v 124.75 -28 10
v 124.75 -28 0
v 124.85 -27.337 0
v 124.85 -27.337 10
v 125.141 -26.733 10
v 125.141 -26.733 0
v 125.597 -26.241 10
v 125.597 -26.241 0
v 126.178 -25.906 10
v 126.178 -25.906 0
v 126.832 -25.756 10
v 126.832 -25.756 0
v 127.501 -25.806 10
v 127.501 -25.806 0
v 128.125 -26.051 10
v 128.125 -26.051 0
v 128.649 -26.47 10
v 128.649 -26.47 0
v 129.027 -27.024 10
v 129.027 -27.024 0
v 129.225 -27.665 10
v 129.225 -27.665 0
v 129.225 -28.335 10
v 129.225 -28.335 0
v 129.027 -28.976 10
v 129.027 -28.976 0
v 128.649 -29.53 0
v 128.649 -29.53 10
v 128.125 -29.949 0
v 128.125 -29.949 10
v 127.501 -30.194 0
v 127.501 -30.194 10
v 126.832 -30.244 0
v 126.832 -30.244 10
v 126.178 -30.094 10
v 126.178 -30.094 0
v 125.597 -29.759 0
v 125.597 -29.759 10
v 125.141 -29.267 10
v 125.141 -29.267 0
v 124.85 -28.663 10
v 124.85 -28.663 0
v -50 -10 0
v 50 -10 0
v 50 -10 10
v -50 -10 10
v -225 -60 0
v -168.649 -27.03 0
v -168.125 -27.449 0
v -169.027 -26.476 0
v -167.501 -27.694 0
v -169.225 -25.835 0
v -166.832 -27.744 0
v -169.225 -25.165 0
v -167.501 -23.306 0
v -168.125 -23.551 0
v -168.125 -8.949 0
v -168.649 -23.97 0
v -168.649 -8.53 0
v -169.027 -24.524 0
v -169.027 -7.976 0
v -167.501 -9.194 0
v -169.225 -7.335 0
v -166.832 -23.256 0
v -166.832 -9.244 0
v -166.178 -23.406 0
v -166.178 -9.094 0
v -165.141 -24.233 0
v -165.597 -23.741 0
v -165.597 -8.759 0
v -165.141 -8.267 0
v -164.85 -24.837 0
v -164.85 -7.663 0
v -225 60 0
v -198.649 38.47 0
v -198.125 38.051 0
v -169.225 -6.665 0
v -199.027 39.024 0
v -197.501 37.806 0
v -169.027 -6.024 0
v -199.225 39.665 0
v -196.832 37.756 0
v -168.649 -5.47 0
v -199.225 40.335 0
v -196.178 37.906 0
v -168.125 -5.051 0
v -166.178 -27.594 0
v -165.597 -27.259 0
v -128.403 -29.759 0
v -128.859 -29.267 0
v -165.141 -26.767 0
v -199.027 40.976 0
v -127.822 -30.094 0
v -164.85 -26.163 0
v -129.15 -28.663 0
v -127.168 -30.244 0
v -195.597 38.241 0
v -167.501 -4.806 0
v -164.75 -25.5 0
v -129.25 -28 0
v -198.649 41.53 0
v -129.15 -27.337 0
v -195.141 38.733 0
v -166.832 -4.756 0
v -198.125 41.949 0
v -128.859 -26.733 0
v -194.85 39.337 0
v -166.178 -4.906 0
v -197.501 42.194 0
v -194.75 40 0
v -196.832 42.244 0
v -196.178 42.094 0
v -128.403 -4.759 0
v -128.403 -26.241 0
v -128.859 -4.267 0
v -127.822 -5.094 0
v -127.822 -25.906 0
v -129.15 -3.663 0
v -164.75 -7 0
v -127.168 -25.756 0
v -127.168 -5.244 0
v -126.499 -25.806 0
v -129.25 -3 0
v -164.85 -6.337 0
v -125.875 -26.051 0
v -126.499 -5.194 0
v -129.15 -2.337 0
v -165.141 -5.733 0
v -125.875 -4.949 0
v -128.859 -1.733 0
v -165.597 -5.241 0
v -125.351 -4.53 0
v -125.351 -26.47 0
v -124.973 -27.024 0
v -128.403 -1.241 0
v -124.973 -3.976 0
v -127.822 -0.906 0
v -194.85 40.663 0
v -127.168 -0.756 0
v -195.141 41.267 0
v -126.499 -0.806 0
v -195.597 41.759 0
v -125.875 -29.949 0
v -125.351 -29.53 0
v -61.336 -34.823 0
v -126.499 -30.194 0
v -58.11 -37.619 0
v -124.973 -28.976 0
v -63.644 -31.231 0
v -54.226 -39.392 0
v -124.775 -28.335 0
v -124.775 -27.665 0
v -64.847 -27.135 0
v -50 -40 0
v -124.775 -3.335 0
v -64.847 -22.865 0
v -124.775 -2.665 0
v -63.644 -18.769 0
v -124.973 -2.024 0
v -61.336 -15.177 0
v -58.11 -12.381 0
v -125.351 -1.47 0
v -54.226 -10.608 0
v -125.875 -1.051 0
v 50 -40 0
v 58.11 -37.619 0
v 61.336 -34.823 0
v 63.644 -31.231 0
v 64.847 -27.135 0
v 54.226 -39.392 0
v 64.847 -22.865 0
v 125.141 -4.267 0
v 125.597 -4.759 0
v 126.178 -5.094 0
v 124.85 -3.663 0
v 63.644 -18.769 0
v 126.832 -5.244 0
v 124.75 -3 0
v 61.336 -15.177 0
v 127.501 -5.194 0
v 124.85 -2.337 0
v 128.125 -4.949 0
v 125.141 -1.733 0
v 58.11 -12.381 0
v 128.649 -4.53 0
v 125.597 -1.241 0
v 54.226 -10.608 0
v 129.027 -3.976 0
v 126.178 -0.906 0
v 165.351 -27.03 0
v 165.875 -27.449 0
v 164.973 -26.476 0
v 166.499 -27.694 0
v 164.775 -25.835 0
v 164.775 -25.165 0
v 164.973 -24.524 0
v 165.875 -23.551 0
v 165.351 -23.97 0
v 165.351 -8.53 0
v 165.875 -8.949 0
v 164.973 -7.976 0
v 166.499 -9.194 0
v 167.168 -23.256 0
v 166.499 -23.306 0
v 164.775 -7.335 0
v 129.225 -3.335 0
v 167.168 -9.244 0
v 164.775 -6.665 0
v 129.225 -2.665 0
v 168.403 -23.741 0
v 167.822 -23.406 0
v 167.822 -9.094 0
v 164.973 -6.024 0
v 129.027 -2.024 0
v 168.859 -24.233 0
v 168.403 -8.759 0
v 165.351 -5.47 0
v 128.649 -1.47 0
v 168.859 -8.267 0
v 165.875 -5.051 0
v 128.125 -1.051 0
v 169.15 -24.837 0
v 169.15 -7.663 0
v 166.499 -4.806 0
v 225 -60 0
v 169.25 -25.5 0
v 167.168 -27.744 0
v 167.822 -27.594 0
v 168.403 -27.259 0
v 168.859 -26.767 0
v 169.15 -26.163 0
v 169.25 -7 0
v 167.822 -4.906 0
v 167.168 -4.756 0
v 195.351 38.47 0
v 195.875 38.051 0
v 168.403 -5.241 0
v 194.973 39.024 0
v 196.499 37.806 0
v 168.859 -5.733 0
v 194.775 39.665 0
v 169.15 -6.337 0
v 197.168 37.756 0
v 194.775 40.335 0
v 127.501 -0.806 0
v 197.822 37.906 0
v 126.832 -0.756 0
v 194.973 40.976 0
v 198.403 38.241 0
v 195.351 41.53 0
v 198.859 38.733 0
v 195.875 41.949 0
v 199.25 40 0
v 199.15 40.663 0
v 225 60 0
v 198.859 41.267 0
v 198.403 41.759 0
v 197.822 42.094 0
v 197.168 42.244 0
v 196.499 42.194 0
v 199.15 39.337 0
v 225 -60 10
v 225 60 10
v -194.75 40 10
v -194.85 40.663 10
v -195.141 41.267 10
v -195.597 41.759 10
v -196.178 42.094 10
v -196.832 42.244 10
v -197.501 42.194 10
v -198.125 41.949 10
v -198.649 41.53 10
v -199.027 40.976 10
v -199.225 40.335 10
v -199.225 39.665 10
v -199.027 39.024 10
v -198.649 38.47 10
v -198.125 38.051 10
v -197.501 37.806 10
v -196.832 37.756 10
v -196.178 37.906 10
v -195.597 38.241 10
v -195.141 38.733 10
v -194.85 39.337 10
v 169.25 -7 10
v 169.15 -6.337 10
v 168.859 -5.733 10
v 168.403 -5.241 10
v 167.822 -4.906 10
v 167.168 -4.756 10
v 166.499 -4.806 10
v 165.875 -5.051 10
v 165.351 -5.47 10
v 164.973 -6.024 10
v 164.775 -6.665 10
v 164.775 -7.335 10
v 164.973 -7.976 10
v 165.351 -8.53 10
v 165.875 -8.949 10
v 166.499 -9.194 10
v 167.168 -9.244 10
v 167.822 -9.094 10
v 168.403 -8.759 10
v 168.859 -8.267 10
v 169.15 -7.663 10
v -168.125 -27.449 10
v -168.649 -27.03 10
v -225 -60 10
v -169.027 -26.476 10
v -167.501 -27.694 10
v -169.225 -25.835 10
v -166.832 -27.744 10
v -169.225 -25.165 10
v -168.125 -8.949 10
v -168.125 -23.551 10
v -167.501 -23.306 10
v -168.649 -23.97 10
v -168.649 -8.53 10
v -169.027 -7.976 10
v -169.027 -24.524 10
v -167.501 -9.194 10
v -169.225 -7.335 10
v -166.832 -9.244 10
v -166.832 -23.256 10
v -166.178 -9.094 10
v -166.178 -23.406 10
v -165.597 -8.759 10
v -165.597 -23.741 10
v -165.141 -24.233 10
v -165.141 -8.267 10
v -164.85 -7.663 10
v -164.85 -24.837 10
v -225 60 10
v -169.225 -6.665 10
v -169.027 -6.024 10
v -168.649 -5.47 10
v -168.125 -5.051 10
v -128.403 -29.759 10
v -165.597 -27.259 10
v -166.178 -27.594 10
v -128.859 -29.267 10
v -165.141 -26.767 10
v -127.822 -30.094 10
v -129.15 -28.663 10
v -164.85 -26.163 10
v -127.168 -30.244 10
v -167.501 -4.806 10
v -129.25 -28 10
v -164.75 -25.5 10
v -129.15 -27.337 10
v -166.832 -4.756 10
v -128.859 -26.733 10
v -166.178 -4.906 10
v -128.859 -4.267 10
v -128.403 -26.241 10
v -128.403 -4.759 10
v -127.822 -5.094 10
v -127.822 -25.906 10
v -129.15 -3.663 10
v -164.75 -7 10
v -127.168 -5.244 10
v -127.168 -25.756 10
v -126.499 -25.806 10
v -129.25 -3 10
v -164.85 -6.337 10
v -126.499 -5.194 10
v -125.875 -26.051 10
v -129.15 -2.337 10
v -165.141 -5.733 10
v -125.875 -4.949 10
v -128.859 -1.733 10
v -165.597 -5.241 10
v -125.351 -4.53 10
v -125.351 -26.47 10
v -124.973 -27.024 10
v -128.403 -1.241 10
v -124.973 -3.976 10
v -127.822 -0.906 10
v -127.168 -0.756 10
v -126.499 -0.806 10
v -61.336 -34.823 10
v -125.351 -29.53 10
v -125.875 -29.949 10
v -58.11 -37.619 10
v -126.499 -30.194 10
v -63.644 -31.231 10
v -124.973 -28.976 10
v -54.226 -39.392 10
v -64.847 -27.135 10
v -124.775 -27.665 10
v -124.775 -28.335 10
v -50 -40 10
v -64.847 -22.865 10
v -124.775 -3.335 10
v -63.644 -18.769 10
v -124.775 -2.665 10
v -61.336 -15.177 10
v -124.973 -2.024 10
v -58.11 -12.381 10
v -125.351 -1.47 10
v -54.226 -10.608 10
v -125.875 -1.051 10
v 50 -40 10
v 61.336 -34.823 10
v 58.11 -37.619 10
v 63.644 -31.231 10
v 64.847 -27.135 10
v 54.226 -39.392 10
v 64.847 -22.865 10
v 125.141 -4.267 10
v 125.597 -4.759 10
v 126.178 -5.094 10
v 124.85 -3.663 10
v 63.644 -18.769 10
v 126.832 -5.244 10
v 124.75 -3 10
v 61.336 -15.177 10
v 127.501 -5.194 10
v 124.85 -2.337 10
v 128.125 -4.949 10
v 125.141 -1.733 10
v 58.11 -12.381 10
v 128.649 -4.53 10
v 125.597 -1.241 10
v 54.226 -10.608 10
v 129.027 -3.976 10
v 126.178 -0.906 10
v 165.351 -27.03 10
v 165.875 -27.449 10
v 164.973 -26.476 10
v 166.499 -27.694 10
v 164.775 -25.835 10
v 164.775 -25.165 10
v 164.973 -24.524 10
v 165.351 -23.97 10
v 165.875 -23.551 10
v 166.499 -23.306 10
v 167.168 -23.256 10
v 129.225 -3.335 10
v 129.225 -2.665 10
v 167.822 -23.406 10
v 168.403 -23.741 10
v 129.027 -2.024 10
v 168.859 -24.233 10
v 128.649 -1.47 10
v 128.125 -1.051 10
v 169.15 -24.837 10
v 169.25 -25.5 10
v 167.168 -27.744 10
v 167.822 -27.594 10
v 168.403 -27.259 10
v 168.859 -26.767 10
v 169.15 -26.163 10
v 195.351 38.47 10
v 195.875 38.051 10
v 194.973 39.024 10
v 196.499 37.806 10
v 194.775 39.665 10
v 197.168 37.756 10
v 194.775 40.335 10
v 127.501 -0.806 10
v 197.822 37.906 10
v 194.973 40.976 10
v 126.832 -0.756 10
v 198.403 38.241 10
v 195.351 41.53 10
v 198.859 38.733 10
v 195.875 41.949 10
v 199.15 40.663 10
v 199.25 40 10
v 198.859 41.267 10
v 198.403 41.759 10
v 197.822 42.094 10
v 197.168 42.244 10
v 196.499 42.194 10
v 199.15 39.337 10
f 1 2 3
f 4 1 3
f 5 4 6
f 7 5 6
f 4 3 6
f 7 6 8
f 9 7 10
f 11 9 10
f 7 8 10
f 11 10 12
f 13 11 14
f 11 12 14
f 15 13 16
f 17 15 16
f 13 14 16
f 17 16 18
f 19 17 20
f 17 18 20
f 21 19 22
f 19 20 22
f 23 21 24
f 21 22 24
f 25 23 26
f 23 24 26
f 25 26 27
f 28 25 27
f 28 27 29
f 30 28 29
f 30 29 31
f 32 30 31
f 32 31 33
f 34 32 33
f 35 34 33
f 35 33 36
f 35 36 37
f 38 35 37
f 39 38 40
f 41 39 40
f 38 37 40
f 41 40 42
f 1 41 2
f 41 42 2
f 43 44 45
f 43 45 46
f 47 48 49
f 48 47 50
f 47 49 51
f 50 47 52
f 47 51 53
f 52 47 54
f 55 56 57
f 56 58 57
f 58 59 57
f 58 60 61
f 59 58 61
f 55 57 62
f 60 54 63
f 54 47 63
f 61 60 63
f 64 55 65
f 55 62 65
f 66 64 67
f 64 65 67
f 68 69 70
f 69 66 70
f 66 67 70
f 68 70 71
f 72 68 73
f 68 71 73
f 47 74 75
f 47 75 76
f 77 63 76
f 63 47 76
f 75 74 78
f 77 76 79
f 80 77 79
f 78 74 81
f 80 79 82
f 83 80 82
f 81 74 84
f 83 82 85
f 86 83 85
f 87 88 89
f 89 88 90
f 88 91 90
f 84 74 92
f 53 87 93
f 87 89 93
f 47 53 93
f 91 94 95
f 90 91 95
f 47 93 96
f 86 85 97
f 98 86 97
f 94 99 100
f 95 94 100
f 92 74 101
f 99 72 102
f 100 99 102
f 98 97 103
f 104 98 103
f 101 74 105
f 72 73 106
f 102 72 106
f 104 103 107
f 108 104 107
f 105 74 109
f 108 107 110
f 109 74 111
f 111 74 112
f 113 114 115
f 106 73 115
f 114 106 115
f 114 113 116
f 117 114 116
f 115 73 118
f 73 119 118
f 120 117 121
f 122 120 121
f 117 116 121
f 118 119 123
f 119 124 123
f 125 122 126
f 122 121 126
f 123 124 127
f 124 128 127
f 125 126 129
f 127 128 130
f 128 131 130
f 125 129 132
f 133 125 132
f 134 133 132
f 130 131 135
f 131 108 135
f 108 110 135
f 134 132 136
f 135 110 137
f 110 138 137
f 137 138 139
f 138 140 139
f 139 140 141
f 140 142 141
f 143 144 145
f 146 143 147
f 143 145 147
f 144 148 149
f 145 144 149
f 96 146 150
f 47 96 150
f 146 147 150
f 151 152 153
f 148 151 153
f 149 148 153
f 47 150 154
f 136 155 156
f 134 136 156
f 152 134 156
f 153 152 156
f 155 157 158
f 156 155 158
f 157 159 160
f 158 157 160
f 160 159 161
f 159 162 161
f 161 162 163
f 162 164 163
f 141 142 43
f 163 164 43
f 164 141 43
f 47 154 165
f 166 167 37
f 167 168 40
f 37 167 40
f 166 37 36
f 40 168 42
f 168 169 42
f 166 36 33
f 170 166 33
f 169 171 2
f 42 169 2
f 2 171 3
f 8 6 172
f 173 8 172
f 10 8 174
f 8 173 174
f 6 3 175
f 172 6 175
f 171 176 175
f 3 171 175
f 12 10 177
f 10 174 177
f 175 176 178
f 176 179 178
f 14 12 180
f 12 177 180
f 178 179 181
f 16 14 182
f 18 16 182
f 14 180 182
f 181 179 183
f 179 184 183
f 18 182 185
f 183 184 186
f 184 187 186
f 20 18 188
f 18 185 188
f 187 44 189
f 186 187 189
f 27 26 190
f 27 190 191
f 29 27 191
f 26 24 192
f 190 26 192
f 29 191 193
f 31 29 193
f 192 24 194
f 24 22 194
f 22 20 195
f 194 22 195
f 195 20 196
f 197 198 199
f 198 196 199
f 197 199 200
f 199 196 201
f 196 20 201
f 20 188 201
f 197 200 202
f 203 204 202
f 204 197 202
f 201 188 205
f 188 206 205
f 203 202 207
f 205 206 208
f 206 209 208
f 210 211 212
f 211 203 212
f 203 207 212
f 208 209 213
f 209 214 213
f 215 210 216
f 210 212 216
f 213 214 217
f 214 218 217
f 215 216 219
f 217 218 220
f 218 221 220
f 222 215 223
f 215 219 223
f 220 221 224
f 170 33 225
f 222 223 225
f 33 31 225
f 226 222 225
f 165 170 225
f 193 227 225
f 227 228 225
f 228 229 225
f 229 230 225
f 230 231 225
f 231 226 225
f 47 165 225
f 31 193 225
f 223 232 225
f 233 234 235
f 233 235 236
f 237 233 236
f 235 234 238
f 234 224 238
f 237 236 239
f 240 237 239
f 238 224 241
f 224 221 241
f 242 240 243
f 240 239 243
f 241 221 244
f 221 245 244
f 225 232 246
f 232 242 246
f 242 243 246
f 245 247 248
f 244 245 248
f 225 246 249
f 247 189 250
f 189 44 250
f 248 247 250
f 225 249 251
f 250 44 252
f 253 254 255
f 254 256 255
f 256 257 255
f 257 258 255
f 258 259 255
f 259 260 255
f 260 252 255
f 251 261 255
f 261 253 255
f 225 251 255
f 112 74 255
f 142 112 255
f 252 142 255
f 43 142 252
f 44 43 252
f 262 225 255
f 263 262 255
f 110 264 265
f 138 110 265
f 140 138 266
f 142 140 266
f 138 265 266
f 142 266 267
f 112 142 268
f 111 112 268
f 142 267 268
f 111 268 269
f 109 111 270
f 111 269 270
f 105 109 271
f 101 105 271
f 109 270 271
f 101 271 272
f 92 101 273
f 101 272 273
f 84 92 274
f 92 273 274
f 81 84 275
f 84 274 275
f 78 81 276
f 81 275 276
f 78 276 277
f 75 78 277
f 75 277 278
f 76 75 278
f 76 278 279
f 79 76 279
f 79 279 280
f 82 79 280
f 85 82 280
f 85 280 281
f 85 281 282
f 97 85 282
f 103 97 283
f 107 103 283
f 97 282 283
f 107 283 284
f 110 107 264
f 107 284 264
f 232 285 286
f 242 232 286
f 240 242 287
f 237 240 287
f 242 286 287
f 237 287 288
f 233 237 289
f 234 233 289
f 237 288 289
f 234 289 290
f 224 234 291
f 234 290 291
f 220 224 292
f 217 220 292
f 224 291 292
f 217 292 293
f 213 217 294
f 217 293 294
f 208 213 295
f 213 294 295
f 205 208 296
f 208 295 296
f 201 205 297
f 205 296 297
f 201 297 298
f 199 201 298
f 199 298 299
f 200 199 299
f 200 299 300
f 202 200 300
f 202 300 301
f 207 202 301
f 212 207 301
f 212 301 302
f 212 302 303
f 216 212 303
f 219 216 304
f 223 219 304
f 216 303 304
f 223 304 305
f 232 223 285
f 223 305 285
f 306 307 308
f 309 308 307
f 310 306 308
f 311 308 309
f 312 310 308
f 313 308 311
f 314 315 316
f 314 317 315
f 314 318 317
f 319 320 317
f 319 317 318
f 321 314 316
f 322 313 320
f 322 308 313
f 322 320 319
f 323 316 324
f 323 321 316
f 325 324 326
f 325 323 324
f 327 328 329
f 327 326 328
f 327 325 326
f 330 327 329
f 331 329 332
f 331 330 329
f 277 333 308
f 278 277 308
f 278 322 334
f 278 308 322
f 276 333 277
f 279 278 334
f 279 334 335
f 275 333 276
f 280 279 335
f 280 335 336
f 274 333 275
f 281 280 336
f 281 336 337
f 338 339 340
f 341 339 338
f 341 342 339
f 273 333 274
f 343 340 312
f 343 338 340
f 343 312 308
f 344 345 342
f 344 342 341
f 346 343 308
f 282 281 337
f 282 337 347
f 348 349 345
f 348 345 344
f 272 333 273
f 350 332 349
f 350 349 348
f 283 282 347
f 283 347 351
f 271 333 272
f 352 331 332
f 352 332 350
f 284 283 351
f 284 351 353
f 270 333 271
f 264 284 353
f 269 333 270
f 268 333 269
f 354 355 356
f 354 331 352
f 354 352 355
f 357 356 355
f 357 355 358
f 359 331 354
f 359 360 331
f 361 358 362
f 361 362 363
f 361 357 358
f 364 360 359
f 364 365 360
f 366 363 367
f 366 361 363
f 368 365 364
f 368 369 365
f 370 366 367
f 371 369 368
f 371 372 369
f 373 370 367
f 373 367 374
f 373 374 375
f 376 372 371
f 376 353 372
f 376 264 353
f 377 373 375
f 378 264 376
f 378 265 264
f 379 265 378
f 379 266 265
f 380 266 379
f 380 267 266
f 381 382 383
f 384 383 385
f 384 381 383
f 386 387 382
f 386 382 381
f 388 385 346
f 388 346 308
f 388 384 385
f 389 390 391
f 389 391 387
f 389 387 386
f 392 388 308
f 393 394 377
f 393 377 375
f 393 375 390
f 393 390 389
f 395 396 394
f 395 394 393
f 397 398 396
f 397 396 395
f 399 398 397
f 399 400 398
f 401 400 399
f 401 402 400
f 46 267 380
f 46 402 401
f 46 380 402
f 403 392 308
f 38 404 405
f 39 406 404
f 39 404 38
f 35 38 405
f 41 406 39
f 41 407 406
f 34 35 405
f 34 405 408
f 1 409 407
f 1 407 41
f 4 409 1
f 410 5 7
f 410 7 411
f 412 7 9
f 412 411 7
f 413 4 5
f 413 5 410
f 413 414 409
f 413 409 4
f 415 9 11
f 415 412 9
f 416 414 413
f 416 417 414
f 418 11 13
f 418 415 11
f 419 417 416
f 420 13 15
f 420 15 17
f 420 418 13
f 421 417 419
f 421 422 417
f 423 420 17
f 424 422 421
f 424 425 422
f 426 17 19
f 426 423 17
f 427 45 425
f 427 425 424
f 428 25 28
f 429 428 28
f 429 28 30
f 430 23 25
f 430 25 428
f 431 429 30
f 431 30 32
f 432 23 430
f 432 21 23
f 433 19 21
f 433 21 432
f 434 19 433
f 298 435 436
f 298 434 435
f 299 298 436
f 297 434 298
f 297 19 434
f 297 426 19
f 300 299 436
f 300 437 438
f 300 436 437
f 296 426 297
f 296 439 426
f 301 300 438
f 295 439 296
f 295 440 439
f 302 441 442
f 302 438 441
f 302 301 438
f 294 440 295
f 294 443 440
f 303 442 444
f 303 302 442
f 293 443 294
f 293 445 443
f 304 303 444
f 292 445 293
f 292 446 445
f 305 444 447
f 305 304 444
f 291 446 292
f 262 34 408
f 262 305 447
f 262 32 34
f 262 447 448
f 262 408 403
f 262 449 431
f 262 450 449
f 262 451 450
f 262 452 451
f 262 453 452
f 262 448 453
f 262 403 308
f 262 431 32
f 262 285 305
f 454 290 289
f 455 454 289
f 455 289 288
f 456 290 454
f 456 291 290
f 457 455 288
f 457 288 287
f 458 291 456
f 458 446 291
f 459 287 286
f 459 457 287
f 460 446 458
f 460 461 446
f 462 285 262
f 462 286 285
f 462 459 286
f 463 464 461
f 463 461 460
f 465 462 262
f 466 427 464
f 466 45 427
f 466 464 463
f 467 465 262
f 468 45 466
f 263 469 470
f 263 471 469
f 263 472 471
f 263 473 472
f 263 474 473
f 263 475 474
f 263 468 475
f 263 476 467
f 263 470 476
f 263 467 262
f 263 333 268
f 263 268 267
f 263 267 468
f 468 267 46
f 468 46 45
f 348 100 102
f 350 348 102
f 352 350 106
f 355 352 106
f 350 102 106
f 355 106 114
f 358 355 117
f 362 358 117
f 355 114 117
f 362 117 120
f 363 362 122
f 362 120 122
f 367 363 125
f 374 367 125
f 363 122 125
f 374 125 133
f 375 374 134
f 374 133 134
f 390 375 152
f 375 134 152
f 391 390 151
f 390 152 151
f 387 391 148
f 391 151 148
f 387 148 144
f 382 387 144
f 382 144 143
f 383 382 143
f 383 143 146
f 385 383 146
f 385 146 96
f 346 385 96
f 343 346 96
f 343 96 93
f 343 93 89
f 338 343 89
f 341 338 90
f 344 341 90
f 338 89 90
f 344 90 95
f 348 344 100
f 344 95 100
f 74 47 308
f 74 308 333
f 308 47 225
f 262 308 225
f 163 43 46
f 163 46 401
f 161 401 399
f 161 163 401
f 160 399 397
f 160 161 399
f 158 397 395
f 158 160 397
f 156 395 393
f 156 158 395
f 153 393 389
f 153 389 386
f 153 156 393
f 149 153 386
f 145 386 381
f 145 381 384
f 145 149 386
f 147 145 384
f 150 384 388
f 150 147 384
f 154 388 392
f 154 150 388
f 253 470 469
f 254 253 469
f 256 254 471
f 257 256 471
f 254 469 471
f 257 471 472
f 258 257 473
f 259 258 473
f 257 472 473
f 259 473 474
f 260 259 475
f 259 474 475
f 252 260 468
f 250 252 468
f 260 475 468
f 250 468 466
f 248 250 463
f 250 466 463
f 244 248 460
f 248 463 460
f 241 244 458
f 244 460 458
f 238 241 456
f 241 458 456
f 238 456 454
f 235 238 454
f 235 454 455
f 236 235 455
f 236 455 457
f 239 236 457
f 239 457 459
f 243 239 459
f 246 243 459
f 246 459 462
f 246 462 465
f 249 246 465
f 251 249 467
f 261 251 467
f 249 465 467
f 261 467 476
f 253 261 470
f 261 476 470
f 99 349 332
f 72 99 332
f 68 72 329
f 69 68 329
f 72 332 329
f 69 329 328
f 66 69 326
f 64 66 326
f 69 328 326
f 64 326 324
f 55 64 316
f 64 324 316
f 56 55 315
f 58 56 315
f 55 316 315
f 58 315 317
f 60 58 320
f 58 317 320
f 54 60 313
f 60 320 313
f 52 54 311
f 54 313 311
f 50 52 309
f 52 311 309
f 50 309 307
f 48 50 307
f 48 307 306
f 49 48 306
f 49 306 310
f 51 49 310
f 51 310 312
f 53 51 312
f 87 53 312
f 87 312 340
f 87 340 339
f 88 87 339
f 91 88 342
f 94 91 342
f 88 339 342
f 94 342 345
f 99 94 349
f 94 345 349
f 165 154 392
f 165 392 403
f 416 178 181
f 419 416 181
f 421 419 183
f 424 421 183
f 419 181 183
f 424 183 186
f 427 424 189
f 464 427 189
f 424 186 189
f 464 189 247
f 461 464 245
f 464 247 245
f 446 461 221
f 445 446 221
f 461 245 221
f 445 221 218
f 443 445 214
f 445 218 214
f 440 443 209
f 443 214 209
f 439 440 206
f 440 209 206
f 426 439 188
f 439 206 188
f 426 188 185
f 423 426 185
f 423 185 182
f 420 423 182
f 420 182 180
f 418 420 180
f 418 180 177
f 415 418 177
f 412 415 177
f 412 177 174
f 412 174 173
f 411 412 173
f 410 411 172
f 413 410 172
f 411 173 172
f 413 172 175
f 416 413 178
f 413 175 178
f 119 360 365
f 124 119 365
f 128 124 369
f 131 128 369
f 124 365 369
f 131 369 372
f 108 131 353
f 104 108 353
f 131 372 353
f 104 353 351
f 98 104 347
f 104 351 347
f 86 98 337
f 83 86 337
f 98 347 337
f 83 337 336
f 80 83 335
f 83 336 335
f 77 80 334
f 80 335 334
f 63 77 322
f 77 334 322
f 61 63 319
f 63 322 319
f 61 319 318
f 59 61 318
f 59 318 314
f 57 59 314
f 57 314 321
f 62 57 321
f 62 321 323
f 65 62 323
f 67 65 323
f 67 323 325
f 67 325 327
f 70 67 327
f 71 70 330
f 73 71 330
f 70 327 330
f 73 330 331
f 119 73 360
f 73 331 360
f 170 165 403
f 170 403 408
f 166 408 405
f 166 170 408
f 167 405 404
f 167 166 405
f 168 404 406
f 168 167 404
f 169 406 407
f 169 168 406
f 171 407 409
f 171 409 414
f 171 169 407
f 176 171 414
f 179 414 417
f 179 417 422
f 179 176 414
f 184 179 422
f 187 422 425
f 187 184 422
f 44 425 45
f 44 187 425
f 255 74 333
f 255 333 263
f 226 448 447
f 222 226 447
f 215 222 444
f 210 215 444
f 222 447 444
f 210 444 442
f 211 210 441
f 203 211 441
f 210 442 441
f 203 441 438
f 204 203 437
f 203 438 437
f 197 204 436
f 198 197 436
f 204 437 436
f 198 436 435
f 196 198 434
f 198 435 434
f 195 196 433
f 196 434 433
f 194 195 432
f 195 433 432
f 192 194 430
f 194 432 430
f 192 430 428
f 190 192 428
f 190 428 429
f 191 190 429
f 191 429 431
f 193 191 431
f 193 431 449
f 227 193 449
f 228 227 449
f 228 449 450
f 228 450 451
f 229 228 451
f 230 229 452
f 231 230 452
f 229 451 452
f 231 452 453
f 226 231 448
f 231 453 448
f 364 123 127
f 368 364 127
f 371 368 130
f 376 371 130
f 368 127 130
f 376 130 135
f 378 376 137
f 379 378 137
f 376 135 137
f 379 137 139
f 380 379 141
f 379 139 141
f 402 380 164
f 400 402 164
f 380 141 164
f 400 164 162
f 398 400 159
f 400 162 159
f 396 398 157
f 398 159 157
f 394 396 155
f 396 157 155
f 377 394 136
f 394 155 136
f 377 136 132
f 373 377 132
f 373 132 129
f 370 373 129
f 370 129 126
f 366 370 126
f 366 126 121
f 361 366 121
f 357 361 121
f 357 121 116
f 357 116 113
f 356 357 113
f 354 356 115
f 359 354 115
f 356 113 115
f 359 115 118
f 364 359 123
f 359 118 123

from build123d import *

# Parameters (mm, degrees)
SCHIZZO1_W                   = 450
SCHIZZO1_H                   = 120
ESTRUSIONE_ESTRUSIONE1_DEPTH = 10
TAGLIO_ESTRUSIONE1_DEPTH     = 10
SCHIZZO3_R                   = 2.25
TAGLIO_ESTRUSIONE2_DEPTH     = 10
SCHIZZO4_R                   = 2.25
TAGLIO_ESTRUSIONE3_DEPTH     = 10


with BuildPart() as part:
    # Schizzo1 → Estrusione-Estrusione1 (new body)
    with BuildSketch(Plane.XY):
        Rectangle(SCHIZZO1_W, SCHIZZO1_H)
    extrude(amount=ESTRUSIONE_ESTRUSIONE1_DEPTH)

    # Schizzo2 → Taglio-Estrusione1 (cut)
    with BuildSketch(Plane(origin=(0, 0, 0), x_dir=(-1, 0, 0), z_dir=(0, 0, -1))):
        with BuildLine():
            Line((-50, -10), (50, -10))
            ThreePointArc((50, -10), (65, -25), (50, -40))
            Line((50, -40), (-50, -40))
            ThreePointArc((-50, -40), (-65, -25), (-50, -10))
        make_face()
    extrude(amount=-TAGLIO_ESTRUSIONE1_DEPTH, mode=Mode.SUBTRACT)

    # Schizzo3 → Taglio-Estrusione2 (cut)
    with BuildSketch(Plane.XY.offset(10)):
        with Locations((-167, -7)):
            Circle(SCHIZZO3_R)
        with Locations((-167, -25.5)):
            Circle(SCHIZZO3_R)
        with Locations((167, -7)):
            Circle(SCHIZZO3_R)
        with Locations((167, -25.5)):
            Circle(SCHIZZO3_R)
        with Locations((197, 40)):
            Circle(SCHIZZO3_R)
        with Locations((-197, 40)):
            Circle(SCHIZZO3_R)
    extrude(amount=-TAGLIO_ESTRUSIONE2_DEPTH, mode=Mode.SUBTRACT)

    # Schizzo4 → Taglio-Estrusione3 (cut)
    with BuildSketch(Plane(origin=(0, 0, 0), x_dir=(-1, 0, 0), z_dir=(0, 0, -1))):
        with Locations((-127, -3)):
            Circle(SCHIZZO4_R)
        with Locations((-127, -28)):
            Circle(SCHIZZO4_R)
        with Locations((127, -28)):
            Circle(SCHIZZO4_R)
        with Locations((127, -3)):
            Circle(SCHIZZO4_R)
    extrude(amount=-TAGLIO_ESTRUSIONE3_DEPTH, mode=Mode.SUBTRACT)


solid = part.part
